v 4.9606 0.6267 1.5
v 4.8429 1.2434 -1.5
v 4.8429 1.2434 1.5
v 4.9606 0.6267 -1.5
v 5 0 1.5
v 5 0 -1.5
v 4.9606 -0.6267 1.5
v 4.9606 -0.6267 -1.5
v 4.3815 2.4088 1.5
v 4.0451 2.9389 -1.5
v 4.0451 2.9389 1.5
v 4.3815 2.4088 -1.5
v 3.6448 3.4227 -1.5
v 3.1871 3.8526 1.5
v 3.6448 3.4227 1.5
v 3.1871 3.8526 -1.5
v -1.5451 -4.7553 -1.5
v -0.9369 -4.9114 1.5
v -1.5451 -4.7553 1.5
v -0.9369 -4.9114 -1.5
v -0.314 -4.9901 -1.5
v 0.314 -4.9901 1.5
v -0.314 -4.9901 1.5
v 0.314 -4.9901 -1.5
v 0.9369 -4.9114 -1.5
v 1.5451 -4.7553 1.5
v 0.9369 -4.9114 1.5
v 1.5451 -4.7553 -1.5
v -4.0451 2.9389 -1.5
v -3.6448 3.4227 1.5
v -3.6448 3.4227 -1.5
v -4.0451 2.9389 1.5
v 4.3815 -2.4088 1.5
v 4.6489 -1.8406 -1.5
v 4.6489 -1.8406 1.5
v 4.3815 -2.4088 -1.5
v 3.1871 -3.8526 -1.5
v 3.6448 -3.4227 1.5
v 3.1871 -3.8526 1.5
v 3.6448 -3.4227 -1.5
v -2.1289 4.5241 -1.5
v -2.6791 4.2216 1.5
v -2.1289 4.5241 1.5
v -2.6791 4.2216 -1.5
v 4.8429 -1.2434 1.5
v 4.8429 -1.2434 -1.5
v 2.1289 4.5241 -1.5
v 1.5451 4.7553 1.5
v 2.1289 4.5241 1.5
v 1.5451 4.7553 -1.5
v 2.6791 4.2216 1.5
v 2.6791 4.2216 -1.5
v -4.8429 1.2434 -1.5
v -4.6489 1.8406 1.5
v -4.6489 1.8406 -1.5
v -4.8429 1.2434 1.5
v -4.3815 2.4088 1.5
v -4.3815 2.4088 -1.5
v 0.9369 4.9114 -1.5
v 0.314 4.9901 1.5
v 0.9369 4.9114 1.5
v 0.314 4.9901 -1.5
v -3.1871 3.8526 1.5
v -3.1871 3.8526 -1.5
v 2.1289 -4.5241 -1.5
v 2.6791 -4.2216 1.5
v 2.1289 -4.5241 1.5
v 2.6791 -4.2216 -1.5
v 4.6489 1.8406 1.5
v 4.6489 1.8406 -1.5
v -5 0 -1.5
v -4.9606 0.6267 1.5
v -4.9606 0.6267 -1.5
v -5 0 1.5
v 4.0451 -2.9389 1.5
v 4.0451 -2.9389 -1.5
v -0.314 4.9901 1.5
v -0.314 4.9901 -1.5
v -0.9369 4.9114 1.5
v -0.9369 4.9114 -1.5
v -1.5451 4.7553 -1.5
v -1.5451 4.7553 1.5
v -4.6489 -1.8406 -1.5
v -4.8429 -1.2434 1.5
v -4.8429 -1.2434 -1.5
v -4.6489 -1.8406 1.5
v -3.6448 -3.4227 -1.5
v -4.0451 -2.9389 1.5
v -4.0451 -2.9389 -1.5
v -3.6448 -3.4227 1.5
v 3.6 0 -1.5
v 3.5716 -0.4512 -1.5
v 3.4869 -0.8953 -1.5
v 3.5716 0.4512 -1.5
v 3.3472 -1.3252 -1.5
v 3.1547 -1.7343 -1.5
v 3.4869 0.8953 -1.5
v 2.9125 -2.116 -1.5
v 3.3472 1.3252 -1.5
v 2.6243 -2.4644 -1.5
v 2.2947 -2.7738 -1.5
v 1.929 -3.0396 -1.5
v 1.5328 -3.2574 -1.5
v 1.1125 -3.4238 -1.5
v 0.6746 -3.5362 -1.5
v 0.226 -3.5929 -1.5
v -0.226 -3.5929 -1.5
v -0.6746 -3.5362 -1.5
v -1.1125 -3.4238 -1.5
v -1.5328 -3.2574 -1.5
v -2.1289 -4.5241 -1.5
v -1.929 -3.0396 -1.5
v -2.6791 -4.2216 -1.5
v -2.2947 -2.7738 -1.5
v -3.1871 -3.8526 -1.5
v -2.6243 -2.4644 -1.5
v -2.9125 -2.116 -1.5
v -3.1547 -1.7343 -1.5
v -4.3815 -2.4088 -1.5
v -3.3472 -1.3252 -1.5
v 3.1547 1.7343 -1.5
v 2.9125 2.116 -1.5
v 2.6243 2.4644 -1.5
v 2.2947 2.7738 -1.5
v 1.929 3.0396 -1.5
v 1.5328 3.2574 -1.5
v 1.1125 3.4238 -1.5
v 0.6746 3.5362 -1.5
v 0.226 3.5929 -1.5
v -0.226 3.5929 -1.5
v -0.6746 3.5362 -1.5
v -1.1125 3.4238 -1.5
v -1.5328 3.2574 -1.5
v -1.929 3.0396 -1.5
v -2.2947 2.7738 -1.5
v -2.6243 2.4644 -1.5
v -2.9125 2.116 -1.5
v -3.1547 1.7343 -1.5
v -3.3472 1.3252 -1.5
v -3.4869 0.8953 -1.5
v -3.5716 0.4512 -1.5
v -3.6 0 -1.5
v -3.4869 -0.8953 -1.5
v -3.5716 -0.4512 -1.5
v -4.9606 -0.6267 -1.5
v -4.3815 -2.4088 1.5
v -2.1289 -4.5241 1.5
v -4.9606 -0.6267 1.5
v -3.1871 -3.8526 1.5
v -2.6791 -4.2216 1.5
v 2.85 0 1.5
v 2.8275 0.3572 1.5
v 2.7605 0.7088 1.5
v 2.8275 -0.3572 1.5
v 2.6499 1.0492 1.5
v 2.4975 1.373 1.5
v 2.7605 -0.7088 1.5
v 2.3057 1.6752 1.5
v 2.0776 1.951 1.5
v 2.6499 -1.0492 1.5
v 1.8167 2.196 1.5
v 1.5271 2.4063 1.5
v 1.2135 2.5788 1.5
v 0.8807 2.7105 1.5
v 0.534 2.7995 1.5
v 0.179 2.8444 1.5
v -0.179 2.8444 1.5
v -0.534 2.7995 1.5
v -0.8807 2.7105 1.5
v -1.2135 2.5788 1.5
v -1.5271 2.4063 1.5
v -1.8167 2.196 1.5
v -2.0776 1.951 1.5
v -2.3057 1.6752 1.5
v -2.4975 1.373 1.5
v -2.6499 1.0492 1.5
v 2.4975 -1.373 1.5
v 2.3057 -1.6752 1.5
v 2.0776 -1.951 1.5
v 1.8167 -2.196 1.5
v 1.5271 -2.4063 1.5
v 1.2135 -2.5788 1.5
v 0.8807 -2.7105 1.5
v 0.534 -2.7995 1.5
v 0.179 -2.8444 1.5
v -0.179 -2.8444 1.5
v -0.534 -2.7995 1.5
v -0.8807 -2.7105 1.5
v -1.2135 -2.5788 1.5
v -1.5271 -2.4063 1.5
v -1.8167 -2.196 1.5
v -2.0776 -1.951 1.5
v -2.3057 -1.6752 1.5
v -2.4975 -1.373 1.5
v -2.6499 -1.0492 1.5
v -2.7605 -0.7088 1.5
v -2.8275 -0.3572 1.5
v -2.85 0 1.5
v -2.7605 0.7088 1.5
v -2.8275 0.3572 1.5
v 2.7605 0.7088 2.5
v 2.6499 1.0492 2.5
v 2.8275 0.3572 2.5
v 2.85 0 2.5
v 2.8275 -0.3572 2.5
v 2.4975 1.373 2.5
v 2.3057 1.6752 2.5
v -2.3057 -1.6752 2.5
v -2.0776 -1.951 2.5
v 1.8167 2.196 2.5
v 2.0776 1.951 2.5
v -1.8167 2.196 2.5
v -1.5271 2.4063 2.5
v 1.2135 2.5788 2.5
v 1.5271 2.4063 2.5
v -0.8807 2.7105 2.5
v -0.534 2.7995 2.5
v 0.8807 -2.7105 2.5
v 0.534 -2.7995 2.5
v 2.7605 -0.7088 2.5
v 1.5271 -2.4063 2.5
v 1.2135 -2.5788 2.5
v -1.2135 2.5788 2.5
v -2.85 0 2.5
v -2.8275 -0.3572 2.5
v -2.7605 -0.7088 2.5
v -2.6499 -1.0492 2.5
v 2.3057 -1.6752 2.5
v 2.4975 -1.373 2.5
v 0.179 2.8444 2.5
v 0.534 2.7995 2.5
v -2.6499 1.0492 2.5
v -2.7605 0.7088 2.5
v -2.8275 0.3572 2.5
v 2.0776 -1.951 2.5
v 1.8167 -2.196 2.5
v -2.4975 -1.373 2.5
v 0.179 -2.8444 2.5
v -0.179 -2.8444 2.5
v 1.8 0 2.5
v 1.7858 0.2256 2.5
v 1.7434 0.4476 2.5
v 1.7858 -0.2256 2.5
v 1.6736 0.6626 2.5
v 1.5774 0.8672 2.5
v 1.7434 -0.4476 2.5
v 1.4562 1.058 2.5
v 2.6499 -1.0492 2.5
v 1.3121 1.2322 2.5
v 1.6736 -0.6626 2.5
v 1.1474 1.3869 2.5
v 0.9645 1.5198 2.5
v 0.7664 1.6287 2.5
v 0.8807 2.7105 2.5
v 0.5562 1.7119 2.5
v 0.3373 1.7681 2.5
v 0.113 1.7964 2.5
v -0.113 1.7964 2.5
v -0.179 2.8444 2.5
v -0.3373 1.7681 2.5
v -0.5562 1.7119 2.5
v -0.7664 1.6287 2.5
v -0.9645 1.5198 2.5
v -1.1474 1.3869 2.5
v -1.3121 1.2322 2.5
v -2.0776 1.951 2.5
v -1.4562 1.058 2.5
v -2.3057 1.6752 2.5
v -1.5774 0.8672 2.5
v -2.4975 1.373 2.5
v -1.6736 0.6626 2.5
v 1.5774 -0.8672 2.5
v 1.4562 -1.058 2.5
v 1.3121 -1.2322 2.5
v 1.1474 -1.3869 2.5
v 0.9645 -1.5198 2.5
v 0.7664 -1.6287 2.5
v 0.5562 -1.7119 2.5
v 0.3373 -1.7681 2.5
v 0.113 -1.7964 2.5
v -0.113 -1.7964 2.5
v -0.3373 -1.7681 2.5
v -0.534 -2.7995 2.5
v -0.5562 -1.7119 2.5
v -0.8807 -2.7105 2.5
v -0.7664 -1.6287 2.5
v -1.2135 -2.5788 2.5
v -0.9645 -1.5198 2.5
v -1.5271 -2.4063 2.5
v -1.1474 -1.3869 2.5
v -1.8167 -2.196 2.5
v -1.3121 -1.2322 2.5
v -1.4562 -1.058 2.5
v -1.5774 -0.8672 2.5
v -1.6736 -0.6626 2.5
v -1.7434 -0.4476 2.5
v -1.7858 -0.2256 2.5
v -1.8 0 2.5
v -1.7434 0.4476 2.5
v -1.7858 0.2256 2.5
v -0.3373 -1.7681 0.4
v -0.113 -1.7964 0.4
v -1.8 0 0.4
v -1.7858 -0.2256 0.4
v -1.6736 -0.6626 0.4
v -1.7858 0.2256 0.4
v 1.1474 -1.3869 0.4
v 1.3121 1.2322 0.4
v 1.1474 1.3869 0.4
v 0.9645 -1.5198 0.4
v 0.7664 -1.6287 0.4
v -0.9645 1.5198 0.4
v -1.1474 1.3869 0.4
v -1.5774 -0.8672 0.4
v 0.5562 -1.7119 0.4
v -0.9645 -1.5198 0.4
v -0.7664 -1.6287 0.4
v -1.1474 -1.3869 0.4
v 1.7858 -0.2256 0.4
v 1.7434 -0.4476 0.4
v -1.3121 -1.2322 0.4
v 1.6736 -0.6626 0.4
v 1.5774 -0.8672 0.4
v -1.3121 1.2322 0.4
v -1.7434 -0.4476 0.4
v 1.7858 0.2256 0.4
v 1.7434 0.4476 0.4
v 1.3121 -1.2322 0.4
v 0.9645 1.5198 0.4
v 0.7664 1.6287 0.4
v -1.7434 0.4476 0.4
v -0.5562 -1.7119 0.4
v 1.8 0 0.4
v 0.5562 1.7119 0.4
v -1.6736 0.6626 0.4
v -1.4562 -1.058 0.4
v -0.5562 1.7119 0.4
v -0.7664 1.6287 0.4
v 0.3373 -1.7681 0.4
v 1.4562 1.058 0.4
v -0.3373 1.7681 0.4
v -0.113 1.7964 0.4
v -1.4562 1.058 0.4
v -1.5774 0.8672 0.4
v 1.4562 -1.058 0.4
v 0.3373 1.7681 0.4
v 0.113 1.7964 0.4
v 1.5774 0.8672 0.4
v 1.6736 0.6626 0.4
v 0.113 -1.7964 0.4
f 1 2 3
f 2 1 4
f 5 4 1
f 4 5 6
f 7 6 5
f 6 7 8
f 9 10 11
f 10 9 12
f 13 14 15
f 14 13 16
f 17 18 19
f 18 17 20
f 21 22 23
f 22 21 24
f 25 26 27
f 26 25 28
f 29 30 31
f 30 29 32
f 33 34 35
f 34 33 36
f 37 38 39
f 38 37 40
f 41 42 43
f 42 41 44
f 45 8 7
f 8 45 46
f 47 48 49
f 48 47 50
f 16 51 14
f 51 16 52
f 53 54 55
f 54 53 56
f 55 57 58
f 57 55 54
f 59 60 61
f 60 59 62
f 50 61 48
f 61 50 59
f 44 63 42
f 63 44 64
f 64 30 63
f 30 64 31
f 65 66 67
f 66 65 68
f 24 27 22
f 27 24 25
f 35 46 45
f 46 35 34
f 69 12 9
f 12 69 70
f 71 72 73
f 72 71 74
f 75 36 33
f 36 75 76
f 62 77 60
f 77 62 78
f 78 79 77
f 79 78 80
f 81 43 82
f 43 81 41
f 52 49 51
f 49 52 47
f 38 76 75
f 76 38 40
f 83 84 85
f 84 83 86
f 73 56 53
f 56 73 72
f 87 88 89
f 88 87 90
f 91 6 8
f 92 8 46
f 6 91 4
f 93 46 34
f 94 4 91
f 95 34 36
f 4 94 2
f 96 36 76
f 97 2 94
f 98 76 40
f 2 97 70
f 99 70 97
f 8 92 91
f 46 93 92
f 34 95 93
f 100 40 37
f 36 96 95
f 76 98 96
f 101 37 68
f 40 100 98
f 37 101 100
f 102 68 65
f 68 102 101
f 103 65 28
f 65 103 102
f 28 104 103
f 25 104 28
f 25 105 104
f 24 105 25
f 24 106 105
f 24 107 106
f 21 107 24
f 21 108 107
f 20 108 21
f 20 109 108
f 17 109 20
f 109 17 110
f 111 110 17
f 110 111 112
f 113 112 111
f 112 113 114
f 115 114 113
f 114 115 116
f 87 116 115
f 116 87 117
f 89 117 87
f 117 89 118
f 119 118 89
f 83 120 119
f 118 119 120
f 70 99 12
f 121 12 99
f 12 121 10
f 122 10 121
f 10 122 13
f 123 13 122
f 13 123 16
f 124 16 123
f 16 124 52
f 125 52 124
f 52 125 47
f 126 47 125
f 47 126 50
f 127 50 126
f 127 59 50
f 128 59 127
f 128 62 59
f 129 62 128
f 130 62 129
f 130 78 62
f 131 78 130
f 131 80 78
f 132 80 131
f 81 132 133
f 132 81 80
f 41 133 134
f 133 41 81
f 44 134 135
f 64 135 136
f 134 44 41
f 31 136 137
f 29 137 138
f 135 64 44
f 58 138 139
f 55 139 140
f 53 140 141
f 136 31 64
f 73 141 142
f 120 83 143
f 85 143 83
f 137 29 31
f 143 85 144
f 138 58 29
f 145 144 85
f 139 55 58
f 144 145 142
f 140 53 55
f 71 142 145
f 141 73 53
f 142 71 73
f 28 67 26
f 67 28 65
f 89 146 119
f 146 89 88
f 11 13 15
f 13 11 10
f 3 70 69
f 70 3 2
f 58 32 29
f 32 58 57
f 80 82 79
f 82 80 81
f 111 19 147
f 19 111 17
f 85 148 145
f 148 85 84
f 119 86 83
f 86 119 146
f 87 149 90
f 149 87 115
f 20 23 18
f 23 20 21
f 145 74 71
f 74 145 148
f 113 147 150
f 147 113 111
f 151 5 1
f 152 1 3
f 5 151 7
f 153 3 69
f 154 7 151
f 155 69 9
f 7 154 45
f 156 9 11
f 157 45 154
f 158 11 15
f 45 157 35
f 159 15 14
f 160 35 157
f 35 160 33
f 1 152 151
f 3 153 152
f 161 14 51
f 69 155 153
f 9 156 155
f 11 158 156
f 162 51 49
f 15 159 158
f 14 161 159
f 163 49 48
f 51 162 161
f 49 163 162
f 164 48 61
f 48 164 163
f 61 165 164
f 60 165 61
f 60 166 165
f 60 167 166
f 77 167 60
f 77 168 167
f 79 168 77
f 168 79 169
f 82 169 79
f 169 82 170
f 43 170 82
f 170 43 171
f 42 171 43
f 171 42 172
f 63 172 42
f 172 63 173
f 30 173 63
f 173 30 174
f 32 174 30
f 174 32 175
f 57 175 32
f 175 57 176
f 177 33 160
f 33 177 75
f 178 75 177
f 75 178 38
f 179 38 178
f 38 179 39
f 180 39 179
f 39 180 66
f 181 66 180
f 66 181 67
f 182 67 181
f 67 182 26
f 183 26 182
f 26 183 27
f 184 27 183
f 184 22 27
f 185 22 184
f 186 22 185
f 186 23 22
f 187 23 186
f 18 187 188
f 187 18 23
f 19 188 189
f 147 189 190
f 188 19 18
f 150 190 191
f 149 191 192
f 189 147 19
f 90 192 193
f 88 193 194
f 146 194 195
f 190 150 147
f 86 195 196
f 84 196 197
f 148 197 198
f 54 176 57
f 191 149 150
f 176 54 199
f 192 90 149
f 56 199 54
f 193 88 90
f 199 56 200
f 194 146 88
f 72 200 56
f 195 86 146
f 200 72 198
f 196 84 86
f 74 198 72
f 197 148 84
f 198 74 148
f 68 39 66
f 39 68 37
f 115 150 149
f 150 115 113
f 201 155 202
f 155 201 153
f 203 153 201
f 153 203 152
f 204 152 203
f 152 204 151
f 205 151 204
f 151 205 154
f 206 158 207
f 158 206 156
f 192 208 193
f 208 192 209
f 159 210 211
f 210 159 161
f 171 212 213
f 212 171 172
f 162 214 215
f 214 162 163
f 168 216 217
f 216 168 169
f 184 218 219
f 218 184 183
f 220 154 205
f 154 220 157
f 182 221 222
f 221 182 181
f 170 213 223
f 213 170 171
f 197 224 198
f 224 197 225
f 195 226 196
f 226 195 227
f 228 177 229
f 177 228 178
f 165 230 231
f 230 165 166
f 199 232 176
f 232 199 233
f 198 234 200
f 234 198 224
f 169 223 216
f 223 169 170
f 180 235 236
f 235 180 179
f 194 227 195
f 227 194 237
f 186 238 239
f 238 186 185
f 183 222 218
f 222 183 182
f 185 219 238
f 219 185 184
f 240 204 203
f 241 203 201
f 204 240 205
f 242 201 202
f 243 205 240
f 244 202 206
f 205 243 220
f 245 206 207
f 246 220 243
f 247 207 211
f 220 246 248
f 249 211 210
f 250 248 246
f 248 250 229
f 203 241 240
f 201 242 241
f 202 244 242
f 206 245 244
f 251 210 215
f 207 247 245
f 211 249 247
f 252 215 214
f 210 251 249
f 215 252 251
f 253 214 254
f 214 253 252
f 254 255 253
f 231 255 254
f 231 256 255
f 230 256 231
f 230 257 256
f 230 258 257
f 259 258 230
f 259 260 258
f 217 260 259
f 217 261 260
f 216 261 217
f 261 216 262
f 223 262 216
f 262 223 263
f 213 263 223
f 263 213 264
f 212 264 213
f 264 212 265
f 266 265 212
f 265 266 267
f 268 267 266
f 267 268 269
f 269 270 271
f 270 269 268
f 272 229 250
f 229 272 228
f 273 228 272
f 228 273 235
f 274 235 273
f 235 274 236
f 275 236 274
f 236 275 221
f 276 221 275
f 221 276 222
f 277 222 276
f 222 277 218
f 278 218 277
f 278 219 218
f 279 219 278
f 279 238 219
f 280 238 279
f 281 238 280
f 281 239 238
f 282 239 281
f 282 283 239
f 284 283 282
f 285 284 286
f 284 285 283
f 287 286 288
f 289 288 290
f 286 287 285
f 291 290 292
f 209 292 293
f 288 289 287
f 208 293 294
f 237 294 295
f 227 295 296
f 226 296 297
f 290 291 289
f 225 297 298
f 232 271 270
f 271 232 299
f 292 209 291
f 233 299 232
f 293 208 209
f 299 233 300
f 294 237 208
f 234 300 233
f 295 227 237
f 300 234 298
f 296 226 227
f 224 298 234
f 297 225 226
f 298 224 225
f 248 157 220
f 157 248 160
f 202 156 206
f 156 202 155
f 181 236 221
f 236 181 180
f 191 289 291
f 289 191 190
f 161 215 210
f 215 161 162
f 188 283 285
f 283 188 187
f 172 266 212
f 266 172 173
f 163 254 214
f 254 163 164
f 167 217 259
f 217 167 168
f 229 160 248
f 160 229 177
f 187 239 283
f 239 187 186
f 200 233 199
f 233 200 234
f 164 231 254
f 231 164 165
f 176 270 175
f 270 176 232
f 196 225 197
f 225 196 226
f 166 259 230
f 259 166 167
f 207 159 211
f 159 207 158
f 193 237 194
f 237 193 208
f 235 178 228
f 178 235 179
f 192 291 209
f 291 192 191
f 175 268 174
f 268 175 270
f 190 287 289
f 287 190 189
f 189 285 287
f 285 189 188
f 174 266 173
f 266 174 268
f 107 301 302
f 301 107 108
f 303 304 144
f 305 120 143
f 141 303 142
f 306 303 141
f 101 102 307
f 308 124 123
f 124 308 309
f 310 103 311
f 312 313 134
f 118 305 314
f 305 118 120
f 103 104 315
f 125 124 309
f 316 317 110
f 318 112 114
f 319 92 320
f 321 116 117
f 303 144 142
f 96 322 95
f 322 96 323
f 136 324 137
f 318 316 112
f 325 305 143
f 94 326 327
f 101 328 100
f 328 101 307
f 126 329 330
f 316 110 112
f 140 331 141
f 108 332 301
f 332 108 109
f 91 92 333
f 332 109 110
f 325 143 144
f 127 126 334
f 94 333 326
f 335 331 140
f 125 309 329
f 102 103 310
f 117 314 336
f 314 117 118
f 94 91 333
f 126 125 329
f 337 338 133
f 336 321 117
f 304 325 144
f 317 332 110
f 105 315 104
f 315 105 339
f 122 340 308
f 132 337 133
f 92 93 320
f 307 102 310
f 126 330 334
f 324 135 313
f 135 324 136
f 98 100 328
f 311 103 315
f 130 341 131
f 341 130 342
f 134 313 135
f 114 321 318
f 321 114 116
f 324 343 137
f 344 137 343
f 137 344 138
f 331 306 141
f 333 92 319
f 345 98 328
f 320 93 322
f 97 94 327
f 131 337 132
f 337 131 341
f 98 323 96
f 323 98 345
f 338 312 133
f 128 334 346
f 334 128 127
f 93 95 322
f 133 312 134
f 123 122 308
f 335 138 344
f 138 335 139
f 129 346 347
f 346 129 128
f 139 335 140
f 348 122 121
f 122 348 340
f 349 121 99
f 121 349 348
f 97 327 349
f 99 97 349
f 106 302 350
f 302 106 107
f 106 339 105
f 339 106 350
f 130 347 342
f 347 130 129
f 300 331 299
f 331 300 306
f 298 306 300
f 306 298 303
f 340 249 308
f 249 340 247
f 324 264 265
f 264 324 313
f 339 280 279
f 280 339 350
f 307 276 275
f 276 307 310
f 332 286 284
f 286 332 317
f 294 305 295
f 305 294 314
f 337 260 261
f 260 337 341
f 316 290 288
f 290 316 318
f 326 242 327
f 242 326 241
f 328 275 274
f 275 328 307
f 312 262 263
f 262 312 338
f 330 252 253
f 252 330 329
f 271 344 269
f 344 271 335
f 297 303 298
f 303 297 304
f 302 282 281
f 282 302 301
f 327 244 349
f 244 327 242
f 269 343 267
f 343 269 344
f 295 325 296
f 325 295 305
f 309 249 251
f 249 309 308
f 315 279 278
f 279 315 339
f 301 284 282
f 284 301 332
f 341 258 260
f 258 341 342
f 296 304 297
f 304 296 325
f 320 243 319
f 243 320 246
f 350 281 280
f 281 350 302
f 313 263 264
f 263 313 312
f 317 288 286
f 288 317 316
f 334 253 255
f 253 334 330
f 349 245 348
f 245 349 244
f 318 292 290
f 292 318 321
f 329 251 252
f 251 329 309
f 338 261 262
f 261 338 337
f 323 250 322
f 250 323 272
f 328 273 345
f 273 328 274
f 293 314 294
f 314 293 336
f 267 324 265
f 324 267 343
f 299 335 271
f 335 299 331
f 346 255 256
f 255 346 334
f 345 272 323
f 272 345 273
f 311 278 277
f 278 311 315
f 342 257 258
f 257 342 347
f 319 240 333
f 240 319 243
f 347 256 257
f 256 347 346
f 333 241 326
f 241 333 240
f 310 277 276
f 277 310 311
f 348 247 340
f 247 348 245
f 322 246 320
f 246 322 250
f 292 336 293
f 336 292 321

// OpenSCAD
$fn = 50;


difference() {
	union() {
		translate(v = [0, 0, -1.5000000000]) {
			cylinder(h = 3, r = 5.0000000000);
		}
		translate(v = [0, 0, -1.5000000000]) {
			cylinder(h = 4, r = 2.8500000000);
		}
	}
	union() {
		translate(v = [0, 0, -1.5000000000]) {
			rotate(a = [0, 180, 0]) {
				difference() {
					union() {
						translate(v = [0, 0, -4.0000000000]) {
							cylinder(h = 4, r = 1.5000000000);
						}
						translate(v = [0, 0, -1.9000000000]) {
							cylinder(h = 1.9000000000, r1 = 1.8000000000, r2 = 3.6000000000);
						}
						translate(v = [0, 0, -4.0000000000]) {
							cylinder(h = 4, r = 1.8000000000);
						}
						translate(v = [0, 0, -4.0000000000]) {
							cylinder(h = 4, r = 1.5000000000);
						}
					}
					union();
				}
			}
		}
		translate(v = [0, 0, -50.0000000000]) {
			cylinder(h = 100, r = 1.8000000000);
		}
	}
}
